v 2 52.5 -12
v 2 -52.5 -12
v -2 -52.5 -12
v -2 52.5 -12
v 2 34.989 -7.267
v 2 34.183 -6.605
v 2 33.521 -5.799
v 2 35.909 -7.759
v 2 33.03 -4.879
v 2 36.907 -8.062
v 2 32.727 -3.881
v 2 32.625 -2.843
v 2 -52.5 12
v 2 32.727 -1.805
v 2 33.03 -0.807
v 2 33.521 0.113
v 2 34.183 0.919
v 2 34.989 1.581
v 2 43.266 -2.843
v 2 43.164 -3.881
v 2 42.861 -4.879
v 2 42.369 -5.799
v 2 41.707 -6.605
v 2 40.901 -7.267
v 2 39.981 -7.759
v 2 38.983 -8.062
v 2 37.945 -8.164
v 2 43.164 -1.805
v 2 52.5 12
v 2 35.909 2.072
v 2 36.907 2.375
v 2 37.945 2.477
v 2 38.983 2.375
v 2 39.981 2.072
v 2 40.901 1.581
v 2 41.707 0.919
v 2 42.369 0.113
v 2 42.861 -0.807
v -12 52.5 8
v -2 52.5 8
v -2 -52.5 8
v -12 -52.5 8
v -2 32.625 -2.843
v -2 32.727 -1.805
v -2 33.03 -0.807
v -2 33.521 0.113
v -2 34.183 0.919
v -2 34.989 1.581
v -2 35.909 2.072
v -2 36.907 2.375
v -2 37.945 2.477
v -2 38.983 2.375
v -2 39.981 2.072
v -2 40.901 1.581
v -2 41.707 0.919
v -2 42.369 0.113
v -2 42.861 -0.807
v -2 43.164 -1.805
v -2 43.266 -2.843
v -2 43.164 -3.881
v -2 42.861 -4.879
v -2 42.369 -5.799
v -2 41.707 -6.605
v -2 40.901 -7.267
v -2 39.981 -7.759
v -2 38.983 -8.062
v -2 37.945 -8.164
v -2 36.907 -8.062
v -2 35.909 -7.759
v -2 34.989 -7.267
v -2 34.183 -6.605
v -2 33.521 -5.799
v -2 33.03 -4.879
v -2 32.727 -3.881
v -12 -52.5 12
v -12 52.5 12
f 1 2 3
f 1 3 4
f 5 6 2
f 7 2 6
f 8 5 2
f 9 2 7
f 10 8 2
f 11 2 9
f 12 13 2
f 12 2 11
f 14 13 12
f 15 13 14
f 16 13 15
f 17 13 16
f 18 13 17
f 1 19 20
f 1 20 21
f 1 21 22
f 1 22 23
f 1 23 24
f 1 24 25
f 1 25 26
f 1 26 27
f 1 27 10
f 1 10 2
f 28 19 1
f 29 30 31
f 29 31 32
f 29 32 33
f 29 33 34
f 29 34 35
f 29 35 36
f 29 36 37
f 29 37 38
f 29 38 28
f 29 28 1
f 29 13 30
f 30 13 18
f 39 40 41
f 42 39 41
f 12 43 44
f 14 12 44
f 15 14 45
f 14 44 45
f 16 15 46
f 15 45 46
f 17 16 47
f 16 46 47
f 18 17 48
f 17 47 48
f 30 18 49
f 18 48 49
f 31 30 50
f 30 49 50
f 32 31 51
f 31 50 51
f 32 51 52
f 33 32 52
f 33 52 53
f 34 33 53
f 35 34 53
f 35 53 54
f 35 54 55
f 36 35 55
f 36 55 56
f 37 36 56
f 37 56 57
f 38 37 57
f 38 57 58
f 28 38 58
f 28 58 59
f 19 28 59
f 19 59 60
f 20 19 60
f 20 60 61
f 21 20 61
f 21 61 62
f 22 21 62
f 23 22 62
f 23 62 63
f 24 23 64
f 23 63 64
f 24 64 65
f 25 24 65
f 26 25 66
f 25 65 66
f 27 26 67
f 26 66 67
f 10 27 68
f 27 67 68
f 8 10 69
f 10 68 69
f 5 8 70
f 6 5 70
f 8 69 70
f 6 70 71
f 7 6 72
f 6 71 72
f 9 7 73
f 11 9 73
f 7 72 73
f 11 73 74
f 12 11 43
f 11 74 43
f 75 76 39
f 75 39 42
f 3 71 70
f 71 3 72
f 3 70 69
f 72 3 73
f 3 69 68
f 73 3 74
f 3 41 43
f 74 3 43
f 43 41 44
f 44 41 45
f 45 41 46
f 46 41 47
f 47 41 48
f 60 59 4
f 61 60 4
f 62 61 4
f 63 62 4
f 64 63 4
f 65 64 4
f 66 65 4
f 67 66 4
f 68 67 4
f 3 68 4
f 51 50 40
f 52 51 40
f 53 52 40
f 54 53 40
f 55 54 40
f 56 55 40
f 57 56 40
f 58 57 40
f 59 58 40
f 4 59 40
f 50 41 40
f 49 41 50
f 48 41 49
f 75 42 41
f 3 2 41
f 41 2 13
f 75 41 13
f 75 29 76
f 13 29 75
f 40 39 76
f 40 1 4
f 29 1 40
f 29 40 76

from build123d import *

# Parameters (mm, degrees)
F0_W          = 105
F0_H          = 24
F1_DEPTH      = 2
F1_DEPTH_BACK = 2
F2_W          = 105
F2_H          = 4
F3_DEPTH      = 10
F4_R          = 5.320603
F5_DEPTH      = 4.001


with BuildPart() as f1:
    # F0 (on Right) → F1 (new body, two sides)
    with BuildSketch(Plane.YZ) as f1_sk:
        Rectangle(F0_W, F0_H)
    extrude(amount=F1_DEPTH)
    extrude(f1_sk.sketch, amount=-F1_DEPTH_BACK)

    # F2 (on face) → F3 (join)
    with BuildSketch(Plane(origin=(-2, 0, 0), x_dir=(0, -1, 0), z_dir=(-1, 0, 0))):
        with Locations((0, 10)):
            Rectangle(F2_W, F2_H)
    extrude(amount=F3_DEPTH)

    # F4 (on face) → F5 (cut, through all)
    with BuildSketch(Plane(origin=(-2, 0, 0), x_dir=(0, -1, 0), z_dir=(-1, 0, 0))):
        with Locations((-37.945189, -2.843227)):
            Circle(F4_R)
    extrude(amount=-F5_DEPTH, mode=Mode.SUBTRACT)


solid = f1.part
